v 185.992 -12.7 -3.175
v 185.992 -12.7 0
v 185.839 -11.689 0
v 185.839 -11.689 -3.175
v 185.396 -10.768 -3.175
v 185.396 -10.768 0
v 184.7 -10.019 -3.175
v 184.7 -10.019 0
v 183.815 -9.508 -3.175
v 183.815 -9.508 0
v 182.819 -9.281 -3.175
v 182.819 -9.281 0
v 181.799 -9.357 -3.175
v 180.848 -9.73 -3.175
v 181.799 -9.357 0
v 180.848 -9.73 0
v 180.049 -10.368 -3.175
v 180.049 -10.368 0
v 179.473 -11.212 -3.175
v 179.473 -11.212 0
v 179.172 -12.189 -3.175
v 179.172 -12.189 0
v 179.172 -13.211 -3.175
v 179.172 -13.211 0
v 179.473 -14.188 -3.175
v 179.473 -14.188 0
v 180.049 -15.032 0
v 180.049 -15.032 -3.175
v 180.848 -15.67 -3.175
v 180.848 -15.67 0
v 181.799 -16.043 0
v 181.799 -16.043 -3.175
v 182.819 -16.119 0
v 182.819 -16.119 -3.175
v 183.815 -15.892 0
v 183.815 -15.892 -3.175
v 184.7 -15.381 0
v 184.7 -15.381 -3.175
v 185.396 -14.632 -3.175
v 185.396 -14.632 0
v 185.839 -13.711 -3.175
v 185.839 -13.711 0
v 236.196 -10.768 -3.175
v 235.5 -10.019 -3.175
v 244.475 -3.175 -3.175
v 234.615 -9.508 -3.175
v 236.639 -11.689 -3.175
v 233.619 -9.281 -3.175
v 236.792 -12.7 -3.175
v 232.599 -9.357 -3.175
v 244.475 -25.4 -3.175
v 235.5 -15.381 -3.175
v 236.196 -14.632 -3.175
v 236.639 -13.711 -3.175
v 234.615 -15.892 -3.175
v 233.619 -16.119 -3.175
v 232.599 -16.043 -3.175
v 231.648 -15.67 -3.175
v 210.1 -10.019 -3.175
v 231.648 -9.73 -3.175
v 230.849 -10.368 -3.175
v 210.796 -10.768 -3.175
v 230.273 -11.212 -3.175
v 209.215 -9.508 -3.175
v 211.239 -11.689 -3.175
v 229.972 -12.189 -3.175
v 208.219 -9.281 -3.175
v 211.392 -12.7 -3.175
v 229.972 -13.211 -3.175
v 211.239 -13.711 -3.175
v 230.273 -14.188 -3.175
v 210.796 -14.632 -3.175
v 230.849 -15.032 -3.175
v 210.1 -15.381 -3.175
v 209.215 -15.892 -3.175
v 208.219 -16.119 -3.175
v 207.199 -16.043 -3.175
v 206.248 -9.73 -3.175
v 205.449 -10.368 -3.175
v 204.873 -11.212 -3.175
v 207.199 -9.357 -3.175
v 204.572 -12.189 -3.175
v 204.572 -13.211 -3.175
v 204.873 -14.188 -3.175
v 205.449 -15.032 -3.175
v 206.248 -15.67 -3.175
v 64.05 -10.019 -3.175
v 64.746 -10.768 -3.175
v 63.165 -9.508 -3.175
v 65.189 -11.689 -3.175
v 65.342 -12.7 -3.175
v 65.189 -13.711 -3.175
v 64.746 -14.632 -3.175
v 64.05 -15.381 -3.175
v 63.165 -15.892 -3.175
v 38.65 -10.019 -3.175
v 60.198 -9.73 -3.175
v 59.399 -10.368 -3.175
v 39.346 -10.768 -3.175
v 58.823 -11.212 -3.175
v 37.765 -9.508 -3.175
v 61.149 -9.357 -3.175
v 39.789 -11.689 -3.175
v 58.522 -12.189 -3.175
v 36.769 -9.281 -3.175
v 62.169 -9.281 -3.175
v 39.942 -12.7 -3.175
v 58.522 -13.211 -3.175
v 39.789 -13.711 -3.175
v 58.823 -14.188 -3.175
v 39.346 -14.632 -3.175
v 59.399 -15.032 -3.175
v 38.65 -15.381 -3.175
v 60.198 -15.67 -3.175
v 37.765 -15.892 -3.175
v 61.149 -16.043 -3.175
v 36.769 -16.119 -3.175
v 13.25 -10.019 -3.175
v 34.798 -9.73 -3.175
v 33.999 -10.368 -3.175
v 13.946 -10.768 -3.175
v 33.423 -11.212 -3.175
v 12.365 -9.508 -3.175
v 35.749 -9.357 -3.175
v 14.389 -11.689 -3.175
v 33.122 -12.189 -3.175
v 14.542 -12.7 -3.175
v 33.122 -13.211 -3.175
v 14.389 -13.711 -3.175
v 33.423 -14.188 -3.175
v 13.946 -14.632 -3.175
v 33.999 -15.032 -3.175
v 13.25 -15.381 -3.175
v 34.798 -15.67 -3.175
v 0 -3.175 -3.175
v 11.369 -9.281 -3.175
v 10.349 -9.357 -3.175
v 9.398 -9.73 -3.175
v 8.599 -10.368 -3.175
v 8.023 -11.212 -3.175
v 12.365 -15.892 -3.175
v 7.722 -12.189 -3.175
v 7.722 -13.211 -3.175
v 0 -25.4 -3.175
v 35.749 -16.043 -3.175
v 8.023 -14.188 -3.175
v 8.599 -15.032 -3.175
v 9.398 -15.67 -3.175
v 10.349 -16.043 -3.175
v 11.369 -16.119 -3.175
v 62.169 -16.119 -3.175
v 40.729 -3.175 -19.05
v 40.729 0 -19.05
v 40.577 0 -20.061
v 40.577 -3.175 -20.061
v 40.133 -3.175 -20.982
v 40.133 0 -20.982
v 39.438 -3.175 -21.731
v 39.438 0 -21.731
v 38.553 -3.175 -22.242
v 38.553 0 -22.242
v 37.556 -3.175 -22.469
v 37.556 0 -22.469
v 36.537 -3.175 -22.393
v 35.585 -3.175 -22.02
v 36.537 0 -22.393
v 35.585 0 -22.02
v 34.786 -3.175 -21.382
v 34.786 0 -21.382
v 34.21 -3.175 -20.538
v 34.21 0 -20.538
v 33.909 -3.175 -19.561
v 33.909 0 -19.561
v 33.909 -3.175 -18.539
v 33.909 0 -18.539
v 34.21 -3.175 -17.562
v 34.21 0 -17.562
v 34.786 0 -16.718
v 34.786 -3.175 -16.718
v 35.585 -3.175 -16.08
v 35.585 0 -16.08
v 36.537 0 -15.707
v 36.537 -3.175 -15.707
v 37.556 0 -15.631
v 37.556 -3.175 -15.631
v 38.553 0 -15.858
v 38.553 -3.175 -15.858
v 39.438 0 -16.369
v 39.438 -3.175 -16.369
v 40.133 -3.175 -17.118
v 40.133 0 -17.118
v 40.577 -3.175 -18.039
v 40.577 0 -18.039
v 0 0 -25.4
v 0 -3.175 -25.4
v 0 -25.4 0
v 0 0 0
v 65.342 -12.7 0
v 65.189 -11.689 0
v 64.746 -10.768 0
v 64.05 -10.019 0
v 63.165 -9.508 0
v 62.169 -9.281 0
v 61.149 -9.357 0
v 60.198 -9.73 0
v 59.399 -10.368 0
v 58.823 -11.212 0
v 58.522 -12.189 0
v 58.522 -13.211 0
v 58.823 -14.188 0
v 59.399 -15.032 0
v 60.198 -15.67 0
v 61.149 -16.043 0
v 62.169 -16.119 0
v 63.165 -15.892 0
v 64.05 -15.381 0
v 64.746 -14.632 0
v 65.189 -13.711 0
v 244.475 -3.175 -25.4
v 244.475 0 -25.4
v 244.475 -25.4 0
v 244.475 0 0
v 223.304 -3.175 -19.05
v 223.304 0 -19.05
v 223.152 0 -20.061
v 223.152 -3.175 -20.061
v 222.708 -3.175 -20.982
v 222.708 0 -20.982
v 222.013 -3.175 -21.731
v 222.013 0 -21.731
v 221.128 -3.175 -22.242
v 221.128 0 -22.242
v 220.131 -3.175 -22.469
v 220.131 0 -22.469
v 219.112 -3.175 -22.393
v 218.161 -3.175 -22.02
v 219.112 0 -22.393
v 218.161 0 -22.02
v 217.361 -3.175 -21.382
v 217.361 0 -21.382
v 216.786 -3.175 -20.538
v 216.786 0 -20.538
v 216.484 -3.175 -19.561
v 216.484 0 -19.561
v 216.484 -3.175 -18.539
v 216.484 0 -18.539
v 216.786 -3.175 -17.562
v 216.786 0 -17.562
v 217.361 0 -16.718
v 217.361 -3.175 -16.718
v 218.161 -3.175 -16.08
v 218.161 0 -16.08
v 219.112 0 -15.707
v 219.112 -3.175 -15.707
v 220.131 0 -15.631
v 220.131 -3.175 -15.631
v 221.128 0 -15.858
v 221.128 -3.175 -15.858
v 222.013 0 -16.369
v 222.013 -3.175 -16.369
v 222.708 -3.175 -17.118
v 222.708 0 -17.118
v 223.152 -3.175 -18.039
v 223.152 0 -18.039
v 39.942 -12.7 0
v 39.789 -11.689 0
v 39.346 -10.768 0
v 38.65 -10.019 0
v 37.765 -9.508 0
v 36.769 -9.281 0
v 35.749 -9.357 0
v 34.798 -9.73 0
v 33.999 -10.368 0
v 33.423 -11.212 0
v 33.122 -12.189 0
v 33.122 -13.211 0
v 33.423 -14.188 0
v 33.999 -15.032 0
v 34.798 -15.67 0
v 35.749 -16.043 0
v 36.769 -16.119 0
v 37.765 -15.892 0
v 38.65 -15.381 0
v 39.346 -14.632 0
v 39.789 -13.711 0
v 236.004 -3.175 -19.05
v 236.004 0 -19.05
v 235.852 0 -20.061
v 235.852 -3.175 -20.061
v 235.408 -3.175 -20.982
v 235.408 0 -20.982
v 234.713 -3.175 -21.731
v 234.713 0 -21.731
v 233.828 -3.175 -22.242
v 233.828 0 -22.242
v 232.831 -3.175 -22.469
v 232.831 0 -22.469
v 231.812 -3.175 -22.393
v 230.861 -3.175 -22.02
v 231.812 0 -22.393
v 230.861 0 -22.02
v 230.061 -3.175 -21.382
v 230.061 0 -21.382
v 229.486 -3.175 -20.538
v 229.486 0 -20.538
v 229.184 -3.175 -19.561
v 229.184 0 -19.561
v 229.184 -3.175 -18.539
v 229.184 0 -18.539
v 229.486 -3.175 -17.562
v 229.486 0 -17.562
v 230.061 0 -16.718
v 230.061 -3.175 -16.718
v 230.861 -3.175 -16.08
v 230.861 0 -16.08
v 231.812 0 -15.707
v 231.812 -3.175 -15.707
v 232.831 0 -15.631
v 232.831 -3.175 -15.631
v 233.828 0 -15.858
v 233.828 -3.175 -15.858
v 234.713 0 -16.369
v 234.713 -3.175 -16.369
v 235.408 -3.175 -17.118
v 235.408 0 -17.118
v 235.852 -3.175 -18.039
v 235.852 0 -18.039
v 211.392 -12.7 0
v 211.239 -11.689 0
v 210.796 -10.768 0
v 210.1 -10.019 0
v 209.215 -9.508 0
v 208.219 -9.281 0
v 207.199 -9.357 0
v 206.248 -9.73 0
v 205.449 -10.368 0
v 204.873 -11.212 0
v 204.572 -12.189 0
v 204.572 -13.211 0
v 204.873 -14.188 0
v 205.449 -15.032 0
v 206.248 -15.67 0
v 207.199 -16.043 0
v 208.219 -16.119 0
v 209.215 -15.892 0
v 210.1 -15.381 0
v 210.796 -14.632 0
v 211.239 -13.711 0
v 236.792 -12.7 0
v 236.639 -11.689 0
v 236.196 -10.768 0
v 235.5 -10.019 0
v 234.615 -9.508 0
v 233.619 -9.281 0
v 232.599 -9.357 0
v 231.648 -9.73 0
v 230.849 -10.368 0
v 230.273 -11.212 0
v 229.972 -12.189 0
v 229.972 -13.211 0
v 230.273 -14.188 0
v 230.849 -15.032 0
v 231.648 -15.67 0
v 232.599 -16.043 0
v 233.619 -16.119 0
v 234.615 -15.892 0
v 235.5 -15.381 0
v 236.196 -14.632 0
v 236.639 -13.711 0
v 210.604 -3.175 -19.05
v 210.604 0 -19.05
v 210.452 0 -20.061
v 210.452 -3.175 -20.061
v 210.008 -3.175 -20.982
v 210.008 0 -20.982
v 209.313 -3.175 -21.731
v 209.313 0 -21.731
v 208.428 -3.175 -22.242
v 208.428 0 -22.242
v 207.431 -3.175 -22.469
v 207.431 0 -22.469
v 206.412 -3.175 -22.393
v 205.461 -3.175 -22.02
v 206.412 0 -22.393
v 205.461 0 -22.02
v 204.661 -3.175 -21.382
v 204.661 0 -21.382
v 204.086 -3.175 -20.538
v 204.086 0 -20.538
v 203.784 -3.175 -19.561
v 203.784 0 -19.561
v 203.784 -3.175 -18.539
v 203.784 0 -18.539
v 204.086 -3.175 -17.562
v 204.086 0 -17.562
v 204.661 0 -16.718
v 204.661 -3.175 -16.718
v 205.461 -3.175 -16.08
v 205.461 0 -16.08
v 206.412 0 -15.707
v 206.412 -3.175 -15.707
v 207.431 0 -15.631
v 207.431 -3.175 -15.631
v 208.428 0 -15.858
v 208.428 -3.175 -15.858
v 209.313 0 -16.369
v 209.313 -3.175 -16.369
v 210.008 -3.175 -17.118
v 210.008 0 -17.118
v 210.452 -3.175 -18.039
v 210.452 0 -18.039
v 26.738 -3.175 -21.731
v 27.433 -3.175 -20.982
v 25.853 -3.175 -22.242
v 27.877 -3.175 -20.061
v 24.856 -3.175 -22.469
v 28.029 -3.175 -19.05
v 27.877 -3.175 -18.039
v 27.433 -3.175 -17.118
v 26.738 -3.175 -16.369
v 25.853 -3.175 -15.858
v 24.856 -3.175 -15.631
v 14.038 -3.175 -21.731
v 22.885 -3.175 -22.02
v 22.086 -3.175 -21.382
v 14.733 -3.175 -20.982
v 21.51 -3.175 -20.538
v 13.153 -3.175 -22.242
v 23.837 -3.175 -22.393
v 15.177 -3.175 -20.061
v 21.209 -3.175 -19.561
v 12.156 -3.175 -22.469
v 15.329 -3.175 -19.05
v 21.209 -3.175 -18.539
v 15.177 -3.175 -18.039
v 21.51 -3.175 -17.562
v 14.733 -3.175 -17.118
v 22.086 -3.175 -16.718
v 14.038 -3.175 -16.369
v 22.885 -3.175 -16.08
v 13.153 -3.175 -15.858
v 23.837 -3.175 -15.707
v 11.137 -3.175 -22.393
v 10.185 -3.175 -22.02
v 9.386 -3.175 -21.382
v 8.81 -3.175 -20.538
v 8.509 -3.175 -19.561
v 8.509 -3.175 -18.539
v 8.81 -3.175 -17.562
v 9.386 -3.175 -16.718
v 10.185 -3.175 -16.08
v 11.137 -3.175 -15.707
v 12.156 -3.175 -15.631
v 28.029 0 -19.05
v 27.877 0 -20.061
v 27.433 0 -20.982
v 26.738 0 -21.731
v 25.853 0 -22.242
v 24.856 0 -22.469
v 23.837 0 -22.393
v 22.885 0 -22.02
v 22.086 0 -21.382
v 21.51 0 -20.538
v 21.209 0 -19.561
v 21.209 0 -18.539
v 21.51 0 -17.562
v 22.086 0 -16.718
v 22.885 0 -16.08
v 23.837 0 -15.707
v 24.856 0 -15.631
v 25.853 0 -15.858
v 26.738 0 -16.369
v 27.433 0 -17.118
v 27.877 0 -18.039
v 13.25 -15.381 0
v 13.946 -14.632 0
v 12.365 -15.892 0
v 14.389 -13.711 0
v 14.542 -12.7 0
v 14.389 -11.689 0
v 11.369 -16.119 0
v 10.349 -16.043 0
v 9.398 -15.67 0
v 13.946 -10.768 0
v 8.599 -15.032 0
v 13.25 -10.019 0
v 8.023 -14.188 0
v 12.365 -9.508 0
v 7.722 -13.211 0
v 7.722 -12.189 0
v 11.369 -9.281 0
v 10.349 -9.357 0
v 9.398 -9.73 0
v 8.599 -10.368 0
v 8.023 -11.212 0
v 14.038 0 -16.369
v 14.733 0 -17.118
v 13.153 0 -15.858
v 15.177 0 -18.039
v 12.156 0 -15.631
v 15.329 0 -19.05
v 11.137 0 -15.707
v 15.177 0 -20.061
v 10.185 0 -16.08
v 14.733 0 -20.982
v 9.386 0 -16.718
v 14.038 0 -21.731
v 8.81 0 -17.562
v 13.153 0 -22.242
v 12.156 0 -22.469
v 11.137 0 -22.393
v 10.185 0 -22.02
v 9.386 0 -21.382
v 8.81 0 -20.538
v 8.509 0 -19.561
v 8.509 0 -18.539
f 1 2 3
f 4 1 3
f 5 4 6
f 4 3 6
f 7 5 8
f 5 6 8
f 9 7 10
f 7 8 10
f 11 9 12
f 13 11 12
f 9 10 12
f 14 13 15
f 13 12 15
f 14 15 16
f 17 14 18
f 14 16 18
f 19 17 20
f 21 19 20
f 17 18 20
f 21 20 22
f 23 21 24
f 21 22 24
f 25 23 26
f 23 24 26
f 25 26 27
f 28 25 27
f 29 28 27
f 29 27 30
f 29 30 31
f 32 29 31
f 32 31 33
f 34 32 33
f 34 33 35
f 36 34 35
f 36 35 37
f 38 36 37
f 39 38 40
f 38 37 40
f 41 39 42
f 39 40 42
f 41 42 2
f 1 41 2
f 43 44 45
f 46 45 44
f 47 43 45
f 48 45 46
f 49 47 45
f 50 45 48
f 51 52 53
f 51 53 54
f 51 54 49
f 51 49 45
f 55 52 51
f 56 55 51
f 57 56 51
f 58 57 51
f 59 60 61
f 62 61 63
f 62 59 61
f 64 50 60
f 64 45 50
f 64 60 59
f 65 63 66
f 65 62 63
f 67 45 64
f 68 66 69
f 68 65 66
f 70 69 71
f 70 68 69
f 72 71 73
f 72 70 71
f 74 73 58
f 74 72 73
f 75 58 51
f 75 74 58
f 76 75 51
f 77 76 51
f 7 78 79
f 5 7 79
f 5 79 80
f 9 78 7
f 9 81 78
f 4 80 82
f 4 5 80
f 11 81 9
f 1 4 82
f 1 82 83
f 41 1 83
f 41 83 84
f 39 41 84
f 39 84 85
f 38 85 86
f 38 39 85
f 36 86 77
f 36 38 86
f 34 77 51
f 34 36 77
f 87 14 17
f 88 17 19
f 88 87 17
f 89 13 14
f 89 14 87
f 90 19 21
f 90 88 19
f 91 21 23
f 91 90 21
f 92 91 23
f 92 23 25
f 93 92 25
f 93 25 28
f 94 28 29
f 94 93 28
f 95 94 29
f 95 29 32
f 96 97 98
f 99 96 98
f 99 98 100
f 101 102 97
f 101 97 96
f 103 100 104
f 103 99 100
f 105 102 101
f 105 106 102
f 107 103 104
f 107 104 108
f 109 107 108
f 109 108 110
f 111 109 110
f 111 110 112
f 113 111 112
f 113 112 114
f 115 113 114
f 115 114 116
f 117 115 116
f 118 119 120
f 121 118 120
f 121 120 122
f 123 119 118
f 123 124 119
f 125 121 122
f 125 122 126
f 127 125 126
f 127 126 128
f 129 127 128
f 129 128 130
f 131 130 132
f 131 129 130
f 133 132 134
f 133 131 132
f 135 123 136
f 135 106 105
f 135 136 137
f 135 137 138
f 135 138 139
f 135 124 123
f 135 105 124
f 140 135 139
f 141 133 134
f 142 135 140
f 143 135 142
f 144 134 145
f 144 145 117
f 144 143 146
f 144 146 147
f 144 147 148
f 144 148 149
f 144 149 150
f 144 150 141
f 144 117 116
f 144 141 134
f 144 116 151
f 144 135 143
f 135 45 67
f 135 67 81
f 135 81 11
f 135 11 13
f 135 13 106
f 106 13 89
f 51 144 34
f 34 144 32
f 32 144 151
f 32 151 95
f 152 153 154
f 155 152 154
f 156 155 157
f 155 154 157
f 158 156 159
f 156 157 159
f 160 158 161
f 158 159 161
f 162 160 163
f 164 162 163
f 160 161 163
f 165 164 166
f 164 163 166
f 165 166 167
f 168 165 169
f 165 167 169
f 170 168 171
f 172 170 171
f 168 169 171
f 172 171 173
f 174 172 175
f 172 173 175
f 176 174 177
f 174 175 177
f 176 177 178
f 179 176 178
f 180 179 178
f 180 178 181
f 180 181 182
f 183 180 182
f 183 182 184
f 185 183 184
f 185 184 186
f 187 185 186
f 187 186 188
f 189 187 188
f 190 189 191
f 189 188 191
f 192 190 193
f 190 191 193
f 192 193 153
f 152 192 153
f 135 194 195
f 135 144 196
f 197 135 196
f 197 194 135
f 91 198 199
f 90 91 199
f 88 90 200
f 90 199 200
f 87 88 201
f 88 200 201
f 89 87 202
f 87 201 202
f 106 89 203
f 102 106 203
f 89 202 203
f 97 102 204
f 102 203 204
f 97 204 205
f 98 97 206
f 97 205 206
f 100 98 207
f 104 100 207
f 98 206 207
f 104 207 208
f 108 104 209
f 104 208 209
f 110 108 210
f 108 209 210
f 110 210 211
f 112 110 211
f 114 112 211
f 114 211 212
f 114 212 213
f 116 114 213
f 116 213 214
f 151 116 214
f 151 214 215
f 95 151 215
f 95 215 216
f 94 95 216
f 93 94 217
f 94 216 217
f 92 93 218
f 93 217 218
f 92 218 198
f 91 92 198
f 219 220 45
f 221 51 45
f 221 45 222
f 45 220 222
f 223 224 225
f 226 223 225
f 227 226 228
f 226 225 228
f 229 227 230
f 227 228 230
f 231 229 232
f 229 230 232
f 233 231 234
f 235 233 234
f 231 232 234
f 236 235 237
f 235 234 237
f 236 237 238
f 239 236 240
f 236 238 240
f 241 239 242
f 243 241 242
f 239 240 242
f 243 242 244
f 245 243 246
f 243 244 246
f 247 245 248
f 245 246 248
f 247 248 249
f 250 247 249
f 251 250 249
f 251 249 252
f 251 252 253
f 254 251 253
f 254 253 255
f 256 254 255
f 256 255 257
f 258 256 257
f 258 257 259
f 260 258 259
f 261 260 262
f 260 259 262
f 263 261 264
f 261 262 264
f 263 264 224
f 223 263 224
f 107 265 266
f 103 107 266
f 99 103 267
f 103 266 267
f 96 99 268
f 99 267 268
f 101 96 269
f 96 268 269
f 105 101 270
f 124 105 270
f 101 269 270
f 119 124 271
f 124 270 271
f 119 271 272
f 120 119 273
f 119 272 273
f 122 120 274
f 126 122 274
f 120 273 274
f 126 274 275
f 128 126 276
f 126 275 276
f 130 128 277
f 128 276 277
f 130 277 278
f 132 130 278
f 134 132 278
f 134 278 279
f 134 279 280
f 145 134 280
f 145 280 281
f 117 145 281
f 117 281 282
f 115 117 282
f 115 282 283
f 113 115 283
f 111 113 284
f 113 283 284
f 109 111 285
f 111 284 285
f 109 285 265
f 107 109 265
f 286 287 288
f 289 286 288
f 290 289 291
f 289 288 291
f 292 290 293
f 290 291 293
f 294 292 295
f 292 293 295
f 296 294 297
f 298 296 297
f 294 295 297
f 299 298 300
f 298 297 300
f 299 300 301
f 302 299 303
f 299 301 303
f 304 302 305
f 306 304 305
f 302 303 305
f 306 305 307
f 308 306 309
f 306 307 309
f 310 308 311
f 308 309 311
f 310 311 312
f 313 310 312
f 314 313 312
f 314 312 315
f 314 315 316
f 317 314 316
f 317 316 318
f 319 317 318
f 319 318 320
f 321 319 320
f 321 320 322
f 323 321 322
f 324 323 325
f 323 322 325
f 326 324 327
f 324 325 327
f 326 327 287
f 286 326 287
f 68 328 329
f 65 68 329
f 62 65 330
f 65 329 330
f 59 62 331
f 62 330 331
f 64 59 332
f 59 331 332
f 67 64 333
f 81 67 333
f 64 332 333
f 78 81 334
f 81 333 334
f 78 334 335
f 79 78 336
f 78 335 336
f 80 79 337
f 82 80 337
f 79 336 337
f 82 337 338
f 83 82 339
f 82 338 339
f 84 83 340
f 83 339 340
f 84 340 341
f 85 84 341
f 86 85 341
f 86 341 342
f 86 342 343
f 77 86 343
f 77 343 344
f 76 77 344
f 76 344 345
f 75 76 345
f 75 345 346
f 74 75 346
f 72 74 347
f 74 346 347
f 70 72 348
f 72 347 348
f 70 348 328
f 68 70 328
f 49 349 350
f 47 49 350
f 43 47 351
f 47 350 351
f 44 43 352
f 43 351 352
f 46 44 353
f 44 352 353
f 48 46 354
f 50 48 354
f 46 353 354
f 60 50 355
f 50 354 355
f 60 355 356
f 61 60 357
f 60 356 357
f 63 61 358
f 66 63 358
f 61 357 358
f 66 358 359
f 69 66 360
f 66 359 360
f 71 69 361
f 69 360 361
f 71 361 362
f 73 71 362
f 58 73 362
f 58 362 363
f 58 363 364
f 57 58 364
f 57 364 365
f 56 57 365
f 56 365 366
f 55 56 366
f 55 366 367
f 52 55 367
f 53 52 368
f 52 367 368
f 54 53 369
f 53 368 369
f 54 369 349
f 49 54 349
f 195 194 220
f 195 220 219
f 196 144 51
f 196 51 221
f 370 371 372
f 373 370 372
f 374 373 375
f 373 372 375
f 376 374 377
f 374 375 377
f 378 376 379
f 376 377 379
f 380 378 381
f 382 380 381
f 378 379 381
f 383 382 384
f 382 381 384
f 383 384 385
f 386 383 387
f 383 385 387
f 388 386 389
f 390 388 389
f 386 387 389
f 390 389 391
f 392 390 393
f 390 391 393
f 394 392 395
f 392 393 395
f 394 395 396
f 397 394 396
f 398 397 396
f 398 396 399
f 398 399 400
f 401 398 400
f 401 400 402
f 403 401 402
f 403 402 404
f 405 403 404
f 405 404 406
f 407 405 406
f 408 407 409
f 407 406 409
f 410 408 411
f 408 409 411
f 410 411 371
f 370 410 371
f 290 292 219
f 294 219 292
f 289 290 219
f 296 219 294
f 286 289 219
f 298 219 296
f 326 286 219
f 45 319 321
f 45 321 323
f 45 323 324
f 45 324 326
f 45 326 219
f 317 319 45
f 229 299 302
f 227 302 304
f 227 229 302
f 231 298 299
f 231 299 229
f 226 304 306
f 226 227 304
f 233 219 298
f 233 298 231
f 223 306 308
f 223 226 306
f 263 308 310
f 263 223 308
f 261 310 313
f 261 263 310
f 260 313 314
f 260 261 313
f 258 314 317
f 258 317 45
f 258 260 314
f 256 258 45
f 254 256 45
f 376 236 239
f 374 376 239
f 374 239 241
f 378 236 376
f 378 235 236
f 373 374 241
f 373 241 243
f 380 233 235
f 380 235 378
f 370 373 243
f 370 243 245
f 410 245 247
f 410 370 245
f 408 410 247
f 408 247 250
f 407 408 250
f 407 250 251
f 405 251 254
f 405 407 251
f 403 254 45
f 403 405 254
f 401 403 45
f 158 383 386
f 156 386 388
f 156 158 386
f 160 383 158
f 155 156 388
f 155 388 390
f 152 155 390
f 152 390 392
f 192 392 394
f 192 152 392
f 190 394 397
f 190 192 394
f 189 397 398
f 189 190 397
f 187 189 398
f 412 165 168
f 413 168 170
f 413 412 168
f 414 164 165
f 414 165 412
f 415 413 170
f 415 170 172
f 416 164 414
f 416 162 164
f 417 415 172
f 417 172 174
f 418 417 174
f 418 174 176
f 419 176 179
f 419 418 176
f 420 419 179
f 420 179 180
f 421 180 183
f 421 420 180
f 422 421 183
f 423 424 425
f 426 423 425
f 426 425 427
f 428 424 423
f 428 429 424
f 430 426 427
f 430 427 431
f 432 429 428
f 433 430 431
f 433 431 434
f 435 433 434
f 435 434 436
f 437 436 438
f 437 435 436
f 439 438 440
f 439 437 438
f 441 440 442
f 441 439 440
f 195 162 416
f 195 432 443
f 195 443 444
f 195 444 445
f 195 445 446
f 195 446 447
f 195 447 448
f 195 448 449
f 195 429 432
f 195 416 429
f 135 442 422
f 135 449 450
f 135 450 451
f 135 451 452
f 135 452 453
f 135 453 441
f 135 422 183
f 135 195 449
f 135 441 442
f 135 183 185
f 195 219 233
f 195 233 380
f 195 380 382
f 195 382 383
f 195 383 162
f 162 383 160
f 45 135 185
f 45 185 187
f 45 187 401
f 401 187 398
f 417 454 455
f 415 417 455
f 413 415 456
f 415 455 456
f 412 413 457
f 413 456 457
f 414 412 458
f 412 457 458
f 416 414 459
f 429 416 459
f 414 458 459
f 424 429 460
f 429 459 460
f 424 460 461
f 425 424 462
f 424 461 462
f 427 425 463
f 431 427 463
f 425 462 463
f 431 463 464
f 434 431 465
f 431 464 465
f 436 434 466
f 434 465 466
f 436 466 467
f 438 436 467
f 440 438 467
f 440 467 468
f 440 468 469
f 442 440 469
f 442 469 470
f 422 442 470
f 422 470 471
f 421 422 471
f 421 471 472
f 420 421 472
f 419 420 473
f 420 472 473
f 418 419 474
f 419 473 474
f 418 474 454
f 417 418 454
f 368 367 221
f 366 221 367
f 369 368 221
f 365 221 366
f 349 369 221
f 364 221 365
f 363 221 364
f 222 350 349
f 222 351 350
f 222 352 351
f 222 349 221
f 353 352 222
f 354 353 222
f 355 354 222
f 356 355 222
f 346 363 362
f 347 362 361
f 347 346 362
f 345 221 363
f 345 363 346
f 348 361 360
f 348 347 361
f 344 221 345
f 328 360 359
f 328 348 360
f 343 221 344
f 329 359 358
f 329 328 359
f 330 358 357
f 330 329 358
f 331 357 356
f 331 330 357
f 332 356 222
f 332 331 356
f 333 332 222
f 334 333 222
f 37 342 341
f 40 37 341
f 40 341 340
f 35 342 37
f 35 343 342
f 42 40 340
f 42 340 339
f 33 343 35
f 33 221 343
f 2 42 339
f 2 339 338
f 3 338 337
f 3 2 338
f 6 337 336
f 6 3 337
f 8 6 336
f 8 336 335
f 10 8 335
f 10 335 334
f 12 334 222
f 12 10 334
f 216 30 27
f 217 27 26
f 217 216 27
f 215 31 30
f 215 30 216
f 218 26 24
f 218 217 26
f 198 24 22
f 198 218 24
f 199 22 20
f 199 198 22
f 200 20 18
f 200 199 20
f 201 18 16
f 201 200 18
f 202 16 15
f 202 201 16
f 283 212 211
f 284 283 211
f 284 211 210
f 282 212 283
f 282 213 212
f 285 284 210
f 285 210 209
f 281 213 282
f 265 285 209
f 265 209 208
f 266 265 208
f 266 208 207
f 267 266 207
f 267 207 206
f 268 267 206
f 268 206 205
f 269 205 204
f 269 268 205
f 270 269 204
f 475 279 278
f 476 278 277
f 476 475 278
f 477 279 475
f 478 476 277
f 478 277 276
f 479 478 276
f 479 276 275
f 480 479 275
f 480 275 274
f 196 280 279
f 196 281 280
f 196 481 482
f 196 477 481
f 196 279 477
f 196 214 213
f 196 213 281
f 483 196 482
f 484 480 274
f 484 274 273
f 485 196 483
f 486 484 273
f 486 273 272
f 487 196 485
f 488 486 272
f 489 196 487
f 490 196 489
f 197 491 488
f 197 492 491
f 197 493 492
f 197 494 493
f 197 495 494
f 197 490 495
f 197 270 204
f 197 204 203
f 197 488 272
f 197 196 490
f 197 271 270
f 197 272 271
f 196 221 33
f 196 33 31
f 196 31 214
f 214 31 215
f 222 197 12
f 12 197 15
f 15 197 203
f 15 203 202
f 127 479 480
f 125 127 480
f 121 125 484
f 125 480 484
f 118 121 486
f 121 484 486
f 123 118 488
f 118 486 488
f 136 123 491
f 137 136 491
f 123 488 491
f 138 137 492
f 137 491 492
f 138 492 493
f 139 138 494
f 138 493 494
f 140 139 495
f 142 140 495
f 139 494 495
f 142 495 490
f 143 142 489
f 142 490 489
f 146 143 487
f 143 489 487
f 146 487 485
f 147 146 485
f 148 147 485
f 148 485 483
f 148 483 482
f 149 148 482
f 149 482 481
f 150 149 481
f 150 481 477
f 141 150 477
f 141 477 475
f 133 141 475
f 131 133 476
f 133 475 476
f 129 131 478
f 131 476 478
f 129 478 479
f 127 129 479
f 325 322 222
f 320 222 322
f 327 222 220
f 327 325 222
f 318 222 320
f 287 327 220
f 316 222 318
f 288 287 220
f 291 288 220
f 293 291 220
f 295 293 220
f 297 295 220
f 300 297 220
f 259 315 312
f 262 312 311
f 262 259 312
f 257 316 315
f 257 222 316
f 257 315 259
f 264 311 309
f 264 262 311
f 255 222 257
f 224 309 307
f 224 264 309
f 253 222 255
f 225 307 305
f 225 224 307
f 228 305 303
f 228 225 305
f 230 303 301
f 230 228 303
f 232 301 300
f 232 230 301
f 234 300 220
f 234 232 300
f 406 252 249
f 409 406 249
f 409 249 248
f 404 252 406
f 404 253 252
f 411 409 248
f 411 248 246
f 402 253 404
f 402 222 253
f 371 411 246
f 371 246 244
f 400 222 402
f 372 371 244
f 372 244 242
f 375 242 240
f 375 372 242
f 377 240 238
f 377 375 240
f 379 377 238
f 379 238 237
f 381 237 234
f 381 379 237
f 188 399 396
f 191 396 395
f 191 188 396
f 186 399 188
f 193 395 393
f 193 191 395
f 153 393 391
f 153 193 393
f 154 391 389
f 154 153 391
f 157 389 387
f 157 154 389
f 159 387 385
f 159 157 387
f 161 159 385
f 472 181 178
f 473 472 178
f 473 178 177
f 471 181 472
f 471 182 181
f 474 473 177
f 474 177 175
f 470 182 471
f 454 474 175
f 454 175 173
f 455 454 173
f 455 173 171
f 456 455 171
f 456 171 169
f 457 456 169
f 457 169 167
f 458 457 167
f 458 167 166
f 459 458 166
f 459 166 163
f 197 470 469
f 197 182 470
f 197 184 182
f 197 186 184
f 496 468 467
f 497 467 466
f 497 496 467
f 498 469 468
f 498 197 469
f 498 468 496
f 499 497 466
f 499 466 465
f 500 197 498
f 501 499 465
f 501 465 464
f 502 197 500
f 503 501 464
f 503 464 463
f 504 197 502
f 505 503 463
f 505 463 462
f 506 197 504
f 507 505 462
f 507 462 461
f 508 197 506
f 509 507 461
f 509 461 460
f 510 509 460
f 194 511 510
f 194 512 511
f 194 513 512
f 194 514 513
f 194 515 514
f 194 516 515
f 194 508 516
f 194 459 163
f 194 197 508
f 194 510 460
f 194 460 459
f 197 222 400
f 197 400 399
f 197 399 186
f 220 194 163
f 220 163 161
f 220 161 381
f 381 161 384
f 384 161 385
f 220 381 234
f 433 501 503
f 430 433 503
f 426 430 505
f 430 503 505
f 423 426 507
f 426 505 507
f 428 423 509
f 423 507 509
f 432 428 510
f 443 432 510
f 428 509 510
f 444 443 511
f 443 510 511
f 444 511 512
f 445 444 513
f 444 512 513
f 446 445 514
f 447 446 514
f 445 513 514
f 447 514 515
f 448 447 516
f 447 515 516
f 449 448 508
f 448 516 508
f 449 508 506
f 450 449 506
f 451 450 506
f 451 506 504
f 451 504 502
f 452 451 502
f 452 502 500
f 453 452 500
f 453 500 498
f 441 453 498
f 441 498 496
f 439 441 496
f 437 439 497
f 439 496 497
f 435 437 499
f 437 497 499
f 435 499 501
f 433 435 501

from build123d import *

# Parameters (mm, degrees)
BOSS_EXTRUDE1_DEPTH = 244.475
SKETCH2_R           = 3.429
CUT_EXTRUDE1_DEPTH  = 3.175
SKETCH3_R           = 3.429
CUT_EXTRUDE2_DEPTH  = 3.175


with BuildPart() as part:
    # Sketch1 → Boss-Extrude1 (new body)
    with BuildSketch(Plane(origin=(0, 0, 0), x_dir=(0, 0, -1), z_dir=(1, 0, 0))):
        Polygon((0, 0), (25.4, 0), (25.4, -3.175), (3.175, -3.175), (3.175, -25.4), (0, -25.4), align=None)
    extrude(amount=BOSS_EXTRUDE1_DEPTH)

    # Sketch2 → Cut-Extrude1 (cut)
    with BuildSketch(Plane.XY):
        with Locations((11.1125, -12.7)):
            Circle(SKETCH2_R)
        with Locations((36.5125, -12.7)):
            Circle(SKETCH2_R)
        with Locations((61.9125, -12.7)):
            Circle(SKETCH2_R)
        with Locations((182.5625, -12.7)):
            Circle(SKETCH2_R)
        with Locations((207.9625, -12.7)):
            Circle(SKETCH2_R)
        with Locations((233.3625, -12.7)):
            Circle(SKETCH2_R)
    extrude(amount=-CUT_EXTRUDE1_DEPTH, mode=Mode.SUBTRACT)

    # Sketch3 → Cut-Extrude2 (cut)
    with BuildSketch(Plane(origin=(0, 0, 0), x_dir=(1, 0, 0), z_dir=(0, 1, 0))):
        with Locations((11.8999, 19.05)):
            Circle(SKETCH3_R)
        with Locations((24.5999, 19.05)):
            Circle(SKETCH3_R)
        with Locations((37.2999, 19.05)):
            Circle(SKETCH3_R)
        with Locations((207.1751, 19.05)):
            Circle(SKETCH3_R)
        with Locations((219.8751, 19.05)):
            Circle(SKETCH3_R)
        with Locations((232.5751, 19.05)):
            Circle(SKETCH3_R)
    extrude(amount=-CUT_EXTRUDE2_DEPTH, mode=Mode.SUBTRACT)


solid = part.part
